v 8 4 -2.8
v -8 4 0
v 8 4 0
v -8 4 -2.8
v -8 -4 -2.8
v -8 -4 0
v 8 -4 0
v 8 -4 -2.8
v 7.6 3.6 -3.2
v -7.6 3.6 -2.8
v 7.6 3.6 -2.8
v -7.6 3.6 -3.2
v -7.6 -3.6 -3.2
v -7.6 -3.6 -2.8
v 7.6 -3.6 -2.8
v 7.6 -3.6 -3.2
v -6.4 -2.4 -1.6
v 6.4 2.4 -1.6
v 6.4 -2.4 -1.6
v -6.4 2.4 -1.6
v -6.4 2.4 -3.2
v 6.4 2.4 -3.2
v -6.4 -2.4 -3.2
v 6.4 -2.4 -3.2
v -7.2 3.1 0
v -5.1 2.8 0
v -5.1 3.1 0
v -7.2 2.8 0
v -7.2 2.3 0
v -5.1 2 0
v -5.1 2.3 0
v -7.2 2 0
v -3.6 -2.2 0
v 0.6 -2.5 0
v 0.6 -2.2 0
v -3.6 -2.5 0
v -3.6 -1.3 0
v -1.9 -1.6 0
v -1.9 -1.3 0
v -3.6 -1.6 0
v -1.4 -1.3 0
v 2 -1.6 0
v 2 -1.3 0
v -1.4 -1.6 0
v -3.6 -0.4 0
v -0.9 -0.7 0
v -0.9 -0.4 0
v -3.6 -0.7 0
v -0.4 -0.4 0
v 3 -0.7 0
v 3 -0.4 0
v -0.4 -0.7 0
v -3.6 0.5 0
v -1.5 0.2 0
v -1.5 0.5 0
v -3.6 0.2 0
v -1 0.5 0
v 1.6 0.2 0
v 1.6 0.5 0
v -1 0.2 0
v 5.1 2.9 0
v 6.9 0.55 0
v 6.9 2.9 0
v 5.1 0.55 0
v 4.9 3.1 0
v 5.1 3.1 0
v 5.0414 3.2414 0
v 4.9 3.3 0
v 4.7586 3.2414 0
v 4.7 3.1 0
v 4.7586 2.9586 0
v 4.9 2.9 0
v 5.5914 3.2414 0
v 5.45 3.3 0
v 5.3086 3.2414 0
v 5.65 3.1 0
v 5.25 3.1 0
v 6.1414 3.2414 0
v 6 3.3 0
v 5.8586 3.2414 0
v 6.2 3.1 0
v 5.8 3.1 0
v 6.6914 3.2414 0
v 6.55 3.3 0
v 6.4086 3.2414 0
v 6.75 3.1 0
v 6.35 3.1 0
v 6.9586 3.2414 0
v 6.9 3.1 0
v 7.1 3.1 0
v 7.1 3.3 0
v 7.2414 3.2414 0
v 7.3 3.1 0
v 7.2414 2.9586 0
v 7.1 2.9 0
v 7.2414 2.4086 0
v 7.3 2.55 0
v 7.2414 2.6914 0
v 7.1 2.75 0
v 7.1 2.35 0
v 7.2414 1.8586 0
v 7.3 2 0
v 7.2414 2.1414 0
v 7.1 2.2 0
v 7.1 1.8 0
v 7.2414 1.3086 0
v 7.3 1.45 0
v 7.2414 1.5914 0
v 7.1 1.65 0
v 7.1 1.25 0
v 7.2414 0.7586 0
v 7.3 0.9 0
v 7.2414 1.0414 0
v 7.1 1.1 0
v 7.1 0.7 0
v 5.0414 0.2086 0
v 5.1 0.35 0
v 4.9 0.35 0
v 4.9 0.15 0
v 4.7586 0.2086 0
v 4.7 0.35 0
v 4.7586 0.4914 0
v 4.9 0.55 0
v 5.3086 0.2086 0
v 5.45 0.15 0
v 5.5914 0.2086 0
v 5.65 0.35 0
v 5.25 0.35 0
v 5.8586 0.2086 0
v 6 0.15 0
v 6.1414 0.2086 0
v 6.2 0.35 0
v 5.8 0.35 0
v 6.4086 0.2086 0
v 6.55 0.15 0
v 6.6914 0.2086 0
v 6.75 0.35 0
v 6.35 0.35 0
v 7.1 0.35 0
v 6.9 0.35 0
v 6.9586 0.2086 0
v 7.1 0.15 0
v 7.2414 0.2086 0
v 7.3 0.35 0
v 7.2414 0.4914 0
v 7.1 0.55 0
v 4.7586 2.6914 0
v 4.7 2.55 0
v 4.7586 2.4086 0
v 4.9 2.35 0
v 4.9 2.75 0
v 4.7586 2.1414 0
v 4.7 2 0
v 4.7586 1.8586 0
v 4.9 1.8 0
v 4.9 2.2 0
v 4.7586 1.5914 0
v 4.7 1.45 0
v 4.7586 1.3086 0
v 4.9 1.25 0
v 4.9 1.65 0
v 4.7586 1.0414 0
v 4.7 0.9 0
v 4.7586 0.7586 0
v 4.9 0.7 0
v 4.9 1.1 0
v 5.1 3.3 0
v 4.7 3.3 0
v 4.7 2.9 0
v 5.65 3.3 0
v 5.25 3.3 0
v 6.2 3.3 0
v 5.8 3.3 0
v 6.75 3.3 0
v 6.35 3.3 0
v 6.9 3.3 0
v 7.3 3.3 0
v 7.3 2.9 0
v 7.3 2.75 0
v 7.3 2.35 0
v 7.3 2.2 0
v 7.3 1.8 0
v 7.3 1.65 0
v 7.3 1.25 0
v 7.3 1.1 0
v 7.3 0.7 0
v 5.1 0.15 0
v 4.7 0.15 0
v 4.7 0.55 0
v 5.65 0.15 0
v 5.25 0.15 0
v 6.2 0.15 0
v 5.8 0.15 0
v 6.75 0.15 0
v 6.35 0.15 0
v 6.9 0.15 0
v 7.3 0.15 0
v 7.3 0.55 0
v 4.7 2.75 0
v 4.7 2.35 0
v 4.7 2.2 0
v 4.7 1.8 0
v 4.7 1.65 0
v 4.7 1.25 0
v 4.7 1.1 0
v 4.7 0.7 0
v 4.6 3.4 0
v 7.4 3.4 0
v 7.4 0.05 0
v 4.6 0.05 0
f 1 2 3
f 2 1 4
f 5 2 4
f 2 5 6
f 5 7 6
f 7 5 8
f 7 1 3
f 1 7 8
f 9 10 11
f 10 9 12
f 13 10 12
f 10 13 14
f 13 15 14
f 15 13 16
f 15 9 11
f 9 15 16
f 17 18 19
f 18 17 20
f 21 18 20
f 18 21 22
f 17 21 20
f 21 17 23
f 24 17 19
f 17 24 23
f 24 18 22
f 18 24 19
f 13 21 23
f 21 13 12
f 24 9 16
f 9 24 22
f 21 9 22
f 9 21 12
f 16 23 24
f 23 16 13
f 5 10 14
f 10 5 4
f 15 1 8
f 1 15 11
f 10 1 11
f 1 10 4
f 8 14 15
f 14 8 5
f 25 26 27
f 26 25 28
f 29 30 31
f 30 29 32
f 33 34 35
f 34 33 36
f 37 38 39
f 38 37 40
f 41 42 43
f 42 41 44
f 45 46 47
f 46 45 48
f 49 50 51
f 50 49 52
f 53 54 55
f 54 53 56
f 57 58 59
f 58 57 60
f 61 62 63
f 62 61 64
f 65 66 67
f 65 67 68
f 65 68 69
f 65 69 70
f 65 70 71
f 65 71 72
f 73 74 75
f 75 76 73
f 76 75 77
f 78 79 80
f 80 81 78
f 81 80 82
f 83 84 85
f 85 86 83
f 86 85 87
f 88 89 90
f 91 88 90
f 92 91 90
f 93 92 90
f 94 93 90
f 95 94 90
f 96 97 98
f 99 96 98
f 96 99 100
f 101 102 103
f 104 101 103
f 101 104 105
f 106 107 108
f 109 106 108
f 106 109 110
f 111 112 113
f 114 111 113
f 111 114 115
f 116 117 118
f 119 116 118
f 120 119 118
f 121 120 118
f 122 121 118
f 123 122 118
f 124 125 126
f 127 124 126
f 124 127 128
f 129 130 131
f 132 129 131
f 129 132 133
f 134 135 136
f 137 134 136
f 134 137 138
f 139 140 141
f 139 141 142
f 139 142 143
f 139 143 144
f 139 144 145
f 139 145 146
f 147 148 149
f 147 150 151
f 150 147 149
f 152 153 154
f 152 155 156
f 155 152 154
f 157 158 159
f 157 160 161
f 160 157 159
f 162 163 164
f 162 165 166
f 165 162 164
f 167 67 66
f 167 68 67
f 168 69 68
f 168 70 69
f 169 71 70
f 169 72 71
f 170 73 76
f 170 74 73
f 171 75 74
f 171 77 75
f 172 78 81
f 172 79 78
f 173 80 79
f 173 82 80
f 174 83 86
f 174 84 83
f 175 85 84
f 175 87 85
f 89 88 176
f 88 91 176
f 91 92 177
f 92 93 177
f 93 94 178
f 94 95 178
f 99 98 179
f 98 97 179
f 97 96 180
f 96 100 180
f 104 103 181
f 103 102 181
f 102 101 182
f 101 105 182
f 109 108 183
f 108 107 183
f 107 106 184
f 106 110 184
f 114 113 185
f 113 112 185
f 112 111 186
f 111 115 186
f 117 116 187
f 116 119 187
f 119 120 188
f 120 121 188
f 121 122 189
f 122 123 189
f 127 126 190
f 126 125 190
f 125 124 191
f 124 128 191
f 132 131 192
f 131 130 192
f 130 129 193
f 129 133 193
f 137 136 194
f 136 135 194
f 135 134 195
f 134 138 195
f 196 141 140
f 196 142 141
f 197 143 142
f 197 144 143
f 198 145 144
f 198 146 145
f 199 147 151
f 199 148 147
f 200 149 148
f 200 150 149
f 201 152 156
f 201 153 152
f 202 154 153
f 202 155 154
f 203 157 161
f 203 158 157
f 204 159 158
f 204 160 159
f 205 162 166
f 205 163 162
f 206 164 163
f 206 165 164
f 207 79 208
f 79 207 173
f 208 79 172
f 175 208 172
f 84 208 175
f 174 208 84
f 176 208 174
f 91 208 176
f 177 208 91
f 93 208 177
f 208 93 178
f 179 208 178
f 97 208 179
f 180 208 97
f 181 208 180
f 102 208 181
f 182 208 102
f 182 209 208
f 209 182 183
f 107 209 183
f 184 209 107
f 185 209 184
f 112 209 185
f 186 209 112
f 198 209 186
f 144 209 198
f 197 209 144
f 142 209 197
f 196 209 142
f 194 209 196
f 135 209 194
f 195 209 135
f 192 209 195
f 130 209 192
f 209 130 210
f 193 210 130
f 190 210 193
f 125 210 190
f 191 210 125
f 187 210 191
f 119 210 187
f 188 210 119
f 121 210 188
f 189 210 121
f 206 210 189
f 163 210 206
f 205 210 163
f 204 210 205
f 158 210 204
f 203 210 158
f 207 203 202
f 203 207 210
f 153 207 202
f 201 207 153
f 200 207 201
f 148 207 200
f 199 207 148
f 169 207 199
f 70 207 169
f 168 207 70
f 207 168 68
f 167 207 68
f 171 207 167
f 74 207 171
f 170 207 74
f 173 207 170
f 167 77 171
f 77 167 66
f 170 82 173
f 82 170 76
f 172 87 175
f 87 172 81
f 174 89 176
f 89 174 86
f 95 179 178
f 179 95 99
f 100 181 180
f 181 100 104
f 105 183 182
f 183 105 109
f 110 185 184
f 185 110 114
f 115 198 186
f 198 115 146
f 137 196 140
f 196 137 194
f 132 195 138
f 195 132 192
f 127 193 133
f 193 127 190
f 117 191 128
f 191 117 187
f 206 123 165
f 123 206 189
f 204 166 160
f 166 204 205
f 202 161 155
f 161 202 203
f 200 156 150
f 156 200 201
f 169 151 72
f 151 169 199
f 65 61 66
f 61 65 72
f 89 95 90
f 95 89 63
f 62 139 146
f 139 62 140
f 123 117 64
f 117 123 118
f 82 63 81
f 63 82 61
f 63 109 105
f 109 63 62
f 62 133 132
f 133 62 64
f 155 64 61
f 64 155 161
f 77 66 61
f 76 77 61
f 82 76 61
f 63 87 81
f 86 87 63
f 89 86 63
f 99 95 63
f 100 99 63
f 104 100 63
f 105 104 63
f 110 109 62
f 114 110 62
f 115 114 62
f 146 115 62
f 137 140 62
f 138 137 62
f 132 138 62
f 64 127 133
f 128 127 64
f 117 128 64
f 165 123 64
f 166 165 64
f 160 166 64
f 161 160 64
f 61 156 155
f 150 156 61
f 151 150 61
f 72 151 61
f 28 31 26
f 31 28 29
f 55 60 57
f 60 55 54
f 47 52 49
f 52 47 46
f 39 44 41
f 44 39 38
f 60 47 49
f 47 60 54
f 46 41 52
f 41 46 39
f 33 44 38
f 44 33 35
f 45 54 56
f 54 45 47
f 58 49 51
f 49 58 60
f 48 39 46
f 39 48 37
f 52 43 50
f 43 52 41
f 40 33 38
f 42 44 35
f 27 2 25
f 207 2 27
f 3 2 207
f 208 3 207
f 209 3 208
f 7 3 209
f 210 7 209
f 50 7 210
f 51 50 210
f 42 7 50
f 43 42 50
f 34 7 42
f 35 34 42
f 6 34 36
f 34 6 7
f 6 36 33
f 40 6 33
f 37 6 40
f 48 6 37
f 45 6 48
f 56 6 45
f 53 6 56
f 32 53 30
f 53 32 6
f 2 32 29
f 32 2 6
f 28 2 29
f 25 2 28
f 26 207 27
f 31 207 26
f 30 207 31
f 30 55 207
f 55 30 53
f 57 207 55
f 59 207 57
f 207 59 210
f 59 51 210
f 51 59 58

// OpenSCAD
// file: ../p/box5.scad
use <../lib.scad>
function ldraw_lib__box5() = [
// 0 Box with 5 Faces and All Edges
// 0 Name: box5.dat
// 0 Author: James Jessiman
// 0 !LDRAW_ORG Primitive UPDATE 2012-01
// 0 !LICENSE Licensed under CC BY 4.0 : see CAreadme.txt
// 
// 0 BFC CERTIFY CCW
  [0,"BFC","CERTIFY"],
  [0,"BFC","CCW"],
// 
// 0 !HISTORY 2002-04-03 [sbliss] Modified for BFC compliance
// 0 !HISTORY 2002-04-25 [PTadmin] Official Update 2002-02
// 0 !HISTORY 2007-06-24 [PTadmin] Header formatted for Contributor Agreement
// 0 !HISTORY 2008-07-01 [PTadmin] Official Update 2008-01
// 0 !HISTORY 2012-02-16 [Philo] Changed to CCW
// 0 !HISTORY 2012-03-30 [PTadmin] Official Update 2012-01
// 
// 
// 2 24 1 1 1 -1 1 1
  [2,24,1,1,1,-1,1,1],
// 2 24 -1 1 1 -1 1 -1
  [2,24,-1,1,1,-1,1,-1],
// 2 24 -1 1 -1 1 1 -1
  [2,24,-1,1,-1,1,1,-1],
// 2 24 1 1 -1 1 1 1
  [2,24,1,1,-1,1,1,1],
// 2 24 1 0 1 -1 0 1
  [2,24,1,0,1,-1,0,1],
// 2 24 -1 0 1 -1 0 -1
  [2,24,-1,0,1,-1,0,-1],
// 2 24 -1 0 -1 1 0 -1
  [2,24,-1,0,-1,1,0,-1],
// 2 24 1 0 -1 1 0 1
  [2,24,1,0,-1,1,0,1],
// 2 24 1 0 1 1 1 1
  [2,24,1,0,1,1,1,1],
// 2 24 -1 0 1 -1 1 1
  [2,24,-1,0,1,-1,1,1],
// 2 24 1 0 -1 1 1 -1
  [2,24,1,0,-1,1,1,-1],
// 2 24 -1 0 -1 -1 1 -1
  [2,24,-1,0,-1,-1,1,-1],
// 4 16 -1 1 1 1 1 1 1 1 -1 -1 1 -1
  [4,16,-1,1,1,1,1,1,1,1,-1,-1,1,-1],
// 4 16 -1 1 1 -1 0 1 1 0 1 1 1 1
  [4,16,-1,1,1,-1,0,1,1,0,1,1,1,1],
// 4 16 -1 1 -1 -1 0 -1 -1 0 1 -1 1 1
  [4,16,-1,1,-1,-1,0,-1,-1,0,1,-1,1,1],
// 4 16 1 1 -1 1 0 -1 -1 0 -1 -1 1 -1
  [4,16,1,1,-1,1,0,-1,-1,0,-1,-1,1,-1],
// 4 16 1 1 1 1 0 1 1 0 -1 1 1 -1
  [4,16,1,1,1,1,0,1,1,0,-1,1,1,-1],
];
module ldraw_lib__box5(step=0, col=false, unit=2/5, alt=false, line=0.2, solid=!$preview)
    makepoly(ldraw_lib__box5(), step=step, col=col, unit=unit, alt=alt, line=line, solid=solid);
ldraw_lib__box5(line=0.2);
// file: ../p/box4.scad
use <../lib.scad>
function ldraw_lib__box4() = [
// 0 Box with 4 Faces (2 Parallel Pairs) and All Edges
// 0 Name: box4.dat
// 0 Author: James Jessiman
// 0 !LDRAW_ORG Primitive UPDATE 2012-01
// 0 !LICENSE Licensed under CC BY 4.0 : see CAreadme.txt
// 
// 0 BFC CERTIFY CCW
  [0,"BFC","CERTIFY"],
  [0,"BFC","CCW"],
// 
// 0 !HISTORY 2002-04-03 [sbliss] Modified for BFC compliance
// 0 !HISTORY 2002-04-25 [PTadmin] Official Update 2002-02
// 0 !HISTORY 2007-06-24 [PTadmin] Header formatted for Contributor Agreement
// 0 !HISTORY 2008-07-01 [PTadmin] Official Update 2008-01
// 0 !HISTORY 2012-02-16 [Philo] Changed to CCW
// 0 !HISTORY 2012-03-30 [PTadmin] Official Update 2012-01
// 
// 
// 2 24 1 1 1 -1 1 1
  [2,24,1,1,1,-1,1,1],
// 2 24 -1 1 1 -1 1 -1
  [2,24,-1,1,1,-1,1,-1],
// 2 24 -1 1 -1 1 1 -1
  [2,24,-1,1,-1,1,1,-1],
// 2 24 1 1 -1 1 1 1
  [2,24,1,1,-1,1,1,1],
// 2 24 1 0 1 -1 0 1
  [2,24,1,0,1,-1,0,1],
// 2 24 -1 0 1 -1 0 -1
  [2,24,-1,0,1,-1,0,-1],
// 2 24 -1 0 -1 1 0 -1
  [2,24,-1,0,-1,1,0,-1],
// 2 24 1 0 -1 1 0 1
  [2,24,1,0,-1,1,0,1],
// 2 24 1 0 1 1 1 1
  [2,24,1,0,1,1,1,1],
// 2 24 -1 0 1 -1 1 1
  [2,24,-1,0,1,-1,1,1],
// 2 24 1 0 -1 1 1 -1
  [2,24,1,0,-1,1,1,-1],
// 2 24 -1 0 -1 -1 1 -1
  [2,24,-1,0,-1,-1,1,-1],
// 4 16 -1 1 1 -1 0 1 1 0 1 1 1 1
  [4,16,-1,1,1,-1,0,1,1,0,1,1,1,1],
// 4 16 -1 1 -1 -1 0 -1 -1 0 1 -1 1 1
  [4,16,-1,1,-1,-1,0,-1,-1,0,1,-1,1,1],
// 4 16 1 1 -1 1 0 -1 -1 0 -1 -1 1 -1
  [4,16,1,1,-1,1,0,-1,-1,0,-1,-1,1,-1],
// 4 16 1 1 1 1 0 1 1 0 -1 1 1 -1
  [4,16,1,1,1,1,0,1,1,0,-1,1,1,-1],
];
module ldraw_lib__box4(step=0, col=false, unit=2/5, alt=false, line=0.2, solid=!$preview)
    makepoly(ldraw_lib__box4(), step=step, col=col, unit=unit, alt=alt, line=line, solid=solid);
ldraw_lib__box4(line=0.2);
// file: s/3069bs01.scad
use <../../lib.scad>
use <../../p/box4.scad>
use <../../p/box5.scad>
function ldraw_lib__s__3069bs01() = [
// 0 ~Tile  1 x  2 with Groove without Top Face
// 0 Name: s\3069bs01.dat
// 0 Author: Santeri Piippo [arezey]
// 0 !LDRAW_ORG Subpart UPDATE 2010-02
// 0 !LICENSE Licensed under CC BY 4.0 : see CAreadme.txt
// 
// 0 BFC CERTIFY CCW
  [0,"BFC","CERTIFY"],
  [0,"BFC","CCW"],
// 
// 0 !HISTORY 2010-07-05 [PTadmin] Official Update 2010-02
// 
// 
// 1 16 0 0 0 20 0 0 0 7 0 0 0 10 box4.dat
  [1,16,0,0,0,20,0,0,0,7,0,0,0,10, ldraw_lib__box4()],
// 1 16 0 7 0 19 0 0 0 1 0 0 0 9 box4.dat
  [1,16,0,7,0,19,0,0,0,1,0,0,0,9, ldraw_lib__box4()],
// 0 BFC INVERTNEXT
  [0,"BFC","INVERTNEXT"],
// 1 16 0 8 0 16 0 0 0 -4 0 0 0 6 box5.dat
  [1,16,0,8,0,16,0,0,0,-4,0,0,0,6, ldraw_lib__box5()],
// 4 16 -19 8 9 -16 8 6 -16 8 -6 -19 8 -9
  [4,16,-19,8,9,-16,8,6,-16,8,-6,-19,8,-9],
// 4 16 19 8 -9 16 8 -6 16 8 6 19 8 9
  [4,16,19,8,-9,16,8,-6,16,8,6,19,8,9],
// 4 16 19 8 9 16 8 6 -16 8 6 -19 8 9
  [4,16,19,8,9,16,8,6,-16,8,6,-19,8,9],
// 4 16 -19 8 -9 -16 8 -6 16 8 -6 19 8 -9
  [4,16,-19,8,-9,-16,8,-6,16,8,-6,19,8,-9],
// 4 16 -20 7 10 -19 7 9 -19 7 -9 -20 7 -10
  [4,16,-20,7,10,-19,7,9,-19,7,-9,-20,7,-10],
// 4 16 20 7 -10 19 7 -9 19 7 9 20 7 10
  [4,16,20,7,-10,19,7,-9,19,7,9,20,7,10],
// 4 16 20 7 10 19 7 9 -19 7 9 -20 7 10
  [4,16,20,7,10,19,7,9,-19,7,9,-20,7,10],
// 4 16 -20 7 -10 -19 7 -9 19 7 -9 20 7 -10
  [4,16,-20,7,-10,-19,7,-9,19,7,-9,20,7,-10],
// 0 //
];
module ldraw_lib__s__3069bs01(step=0, col=false, unit=2/5, alt=false, line=0.2, solid=!$preview)
    makepoly(ldraw_lib__s__3069bs01(), step=step, col=col, unit=unit, alt=alt, line=line, solid=solid);
ldraw_lib__s__3069bs01(line=0.2);
// file: ../p/8/3-4ndis.scad
use <../../lib.scad>
function ldraw_lib__8__3_4ndis() = [
// 0 Lo-Res Disc Negative 0.75
// 0 Name: 8\3-4ndis.dat
// 0 Author: Vincent Messenet [Cheenzo]
// 0 !LDRAW_ORG 8_Primitive UPDATE 2022-03
// 0 !LICENSE Licensed under CC BY 4.0 : see CAreadme.txt
// 
// 0 BFC CERTIFY CCW
  [0,"BFC","CERTIFY"],
  [0,"BFC","CCW"],
// 
// 0 !HISTORY 2022-05-07 [PTadmin] Official Update 2022-03
// 
// 
// 3 16 1 0 1 0.7071 0 0.7071 1 0 0
  [3,16,1,0,1,0.7071,0,0.7071,1,0,0],
// 3 16 1 0 1 0 0 1 0.7071 0 0.7071
  [3,16,1,0,1,0,0,1,0.7071,0,0.7071],
// 3 16 -1 0 1 -0.7071 0 0.7071 0 0 1
  [3,16,-1,0,1,-0.7071,0,0.7071,0,0,1],
// 3 16 -1 0 1 -1 0 0 -0.7071 0 0.7071
  [3,16,-1,0,1,-1,0,0,-0.7071,0,0.7071],
// 3 16 -1 0 -1 -0.7071 0 -0.7071 -1 0 0
  [3,16,-1,0,-1,-0.7071,0,-0.7071,-1,0,0],
// 3 16 -1 0 -1 0 0 -1 -0.7071 0 -0.7071
  [3,16,-1,0,-1,0,0,-1,-0.7071,0,-0.7071],
// 0 // Build by LDPartEditor (PrimGen 2.X)
];
module ldraw_lib__8__3_4ndis(step=0, col=false, unit=2/5, alt=false, line=0.2, solid=!$preview)
    makepoly(ldraw_lib__8__3_4ndis(), step=step, col=col, unit=unit, alt=alt, line=line, solid=solid);
ldraw_lib__8__3_4ndis(line=0.2);
// file: ../p/8/3-4disc.scad
use <../../lib.scad>
function ldraw_lib__8__3_4disc() = [
// 0 Lo-Res Disc 0.75
// 0 Name: 8\3-4disc.dat
// 0 Author: Vincent Messenet [Cheenzo]
// 0 !LDRAW_ORG 8_Primitive UPDATE 2022-03
// 0 !LICENSE Licensed under CC BY 4.0 : see CAreadme.txt
// 
// 0 BFC CERTIFY CCW
  [0,"BFC","CERTIFY"],
  [0,"BFC","CCW"],
// 
// 0 !HISTORY 2022-05-07 [PTadmin] Official Update 2022-03
// 
// 
// 3 16 0 0 0 1 0 0 0.7071 0 0.7071
  [3,16,0,0,0,1,0,0,0.7071,0,0.7071],
// 3 16 0 0 0 0.7071 0 0.7071 0 0 1
  [3,16,0,0,0,0.7071,0,0.7071,0,0,1],
// 3 16 0 0 0 0 0 1 -0.7071 0 0.7071
  [3,16,0,0,0,0,0,1,-0.7071,0,0.7071],
// 3 16 0 0 0 -0.7071 0 0.7071 -1 0 0
  [3,16,0,0,0,-0.7071,0,0.7071,-1,0,0],
// 3 16 0 0 0 -1 0 0 -0.7071 0 -0.7071
  [3,16,0,0,0,-1,0,0,-0.7071,0,-0.7071],
// 3 16 0 0 0 -0.7071 0 -0.7071 0 0 -1
  [3,16,0,0,0,-0.7071,0,-0.7071,0,0,-1],
// 0 // Build by LDPartEditor (PrimGen 2.X)
];
module ldraw_lib__8__3_4disc(step=0, col=false, unit=2/5, alt=false, line=0.2, solid=!$preview)
    makepoly(ldraw_lib__8__3_4disc(), step=step, col=col, unit=unit, alt=alt, line=line, solid=solid);
ldraw_lib__8__3_4disc(line=0.2);
// file: ../p/8/2-4ndis.scad
use <../../lib.scad>
function ldraw_lib__8__2_4ndis() = [
// 0 Lo-Res Disc Negative 0.5
// 0 Name: 8\2-4ndis.dat
// 0 Author: Magnus Forsberg [MagFors]
// 0 !LDRAW_ORG 8_Primitive UPDATE 2018-02
// 0 !LICENSE Licensed under CC BY 4.0 : see CAreadme.txt
// 
// 0 BFC CERTIFY CCW
  [0,"BFC","CERTIFY"],
  [0,"BFC","CCW"],
// 
// 0 !HISTORY 2018-12-08 [PTadmin] Official Update 2018-02
// 
// 
// 3 16 1 0 1 0.7071 0 0.7071 1 0 0
  [3,16,1,0,1,0.7071,0,0.7071,1,0,0],
// 3 16 1 0 1 0 0 1 0.7071 0 0.7071
  [3,16,1,0,1,0,0,1,0.7071,0,0.7071],
// 3 16 -1 0 1 -0.7071 0 0.7071 0 0 1
  [3,16,-1,0,1,-0.7071,0,0.7071,0,0,1],
// 3 16 -1 0 1 -1 0 0 -0.7071 0 0.7071
  [3,16,-1,0,1,-1,0,0,-0.7071,0,0.7071],
// 0 // Build by Primitive Generator 2
];
module ldraw_lib__8__2_4ndis(step=0, col=false, unit=2/5, alt=false, line=0.2, solid=!$preview)
    makepoly(ldraw_lib__8__2_4ndis(), step=step, col=col, unit=unit, alt=alt, line=line, solid=solid);
ldraw_lib__8__2_4ndis(line=0.2);
// file: ../p/8/2-4chrd.scad
use <../../lib.scad>
function ldraw_lib__8__2_4chrd() = [
// 0 Chord 0.5
// 0 Name: 8\2-4chrd.dat
// 0 Author: Magnus Forsberg [MagFors]
// 0 !LDRAW_ORG 8_Primitive UPDATE 2017-01
// 0 !LICENSE Licensed under CC BY 4.0 : see CAreadme.txt
// 
// 0 BFC CERTIFY CCW
  [0,"BFC","CERTIFY"],
  [0,"BFC","CCW"],
// 
// 0 !HISTORY 2017-12-30 [PTadmin] Official Update 2017-01
// 
// 
// 3 16 .7071 0 .7071 0 0 1 -.7071 0 .7071
  [3,16,.7071,0,.7071,0,0,1,-.7071,0,.7071],
// 4 16 .7071 0 .7071 -.7071 0 .7071 -1 0 0 1 0 0
  [4,16,.7071,0,.7071,-.7071,0,.7071,-1,0,0,1,0,0],
];
module ldraw_lib__8__2_4chrd(step=0, col=false, unit=2/5, alt=false, line=0.2, solid=!$preview)
    makepoly(ldraw_lib__8__2_4chrd(), step=step, col=col, unit=unit, alt=alt, line=line, solid=solid);
ldraw_lib__8__2_4chrd(line=0.2);
// main file
use <../lib.scad>
use <../p/8/2-4chrd.scad>
use <../p/8/2-4ndis.scad>
use <../p/8/3-4disc.scad>
use <../p/8/3-4ndis.scad>
use <s/3069bs01.scad>
function ldraw_lib__3069bp0l() = [
// 0 Tile  1 x  2 with Letter and Detailed Stamp Pattern
// 0 Name: 3069bp0l.dat
// 0 Author: Vincent Messenet [Cheenzo]
// 0 !LDRAW_ORG Part UPDATE 2022-03
// 0 !LICENSE Licensed under CC BY 4.0 : see CAreadme.txt
// 
// 0 BFC CERTIFY CW
  [0,"BFC","CERTIFY"],
  [0,"BFC","CW"],
// 
// 0 !KEYWORDS BrickLink 3069bpb851, Set 41449
// 
// 0 !HISTORY 2022-05-07 [PTadmin] Official Update 2022-03
// 
// 
// 1 16 0 0 0 1 0 0 0 1 0 0 0 1 s\3069bs01.dat
  [1,16,0,0,0,1,0,0,0,1,0,0,0,1, ldraw_lib__s__3069bs01()],
// 
// 4 321 -12.75 0 7 -18 0 7 -18 0 7.75 -12.75 0 7.75
  [4,321,-12.75,0,7,-18,0,7,-18,0,7.75,-12.75,0,7.75],
// 4 321 -12.75 0 5 -18 0 5 -18 0 5.75 -12.75 0 5.75
  [4,321,-12.75,0,5,-18,0,5,-18,0,5.75,-12.75,0,5.75],
// 4 321 1.5 0 -5.5 1.5 0 -6.25 -9 0 -6.25 -9 0 -5.5
  [4,321,1.5,0,-5.5,1.5,0,-6.25,-9,0,-6.25,-9,0,-5.5],
// 4 321 -4.75 0 -3.25 -4.75 0 -4 -9 0 -4 -9 0 -3.25
  [4,321,-4.75,0,-3.25,-4.75,0,-4,-9,0,-4,-9,0,-3.25],
// 4 321 5 0 -4 -3.5 0 -4 -3.5 0 -3.25 5 0 -3.25
  [4,321,5,0,-4,-3.5,0,-4,-3.5,0,-3.25,5,0,-3.25],
// 4 321 -2.25 0 -1 -2.25 0 -1.75 -9 0 -1.75 -9 0 -1
  [4,321,-2.25,0,-1,-2.25,0,-1.75,-9,0,-1.75,-9,0,-1],
// 4 321 7.5 0 -1.75 -1 0 -1.75 -1 0 -1 7.5 0 -1
  [4,321,7.5,0,-1.75,-1,0,-1.75,-1,0,-1,7.5,0,-1],
// 4 321 -3.75 0 1.25 -3.75 0 .5 -9 0 .5 -9 0 1.25
  [4,321,-3.75,0,1.25,-3.75,0,.5,-9,0,.5,-9,0,1.25],
// 4 321 -2.5 0 .5 -2.5 0 1.25 4 0 1.25 4 0 .5
  [4,321,-2.5,0,.5,-2.5,0,1.25,4,0,1.25,4,0,.5],
// 4 4 12.75 0 7.25 17.25 0 7.25 17.25 0 1.375 12.75 0 1.375
  [4,4,12.75,0,7.25,17.25,0,7.25,17.25,0,1.375,12.75,0,1.375],
// 1 16 12.25 0 7.75 .5 0 0 0 1 0 0 0 .5 8\3-4disc.dat
  [1,16,12.25,0,7.75,.5,0,0,0,1,0,0,0,.5, ldraw_lib__8__3_4disc()],
// 1 16 13.625 0 7.75 .5 0 0 0 1 0 0 0 .5 8\2-4chrd.dat
  [1,16,13.625,0,7.75,.5,0,0,0,1,0,0,0,.5, ldraw_lib__8__2_4chrd()],
// 1 16 15 0 7.75 .5 0 0 0 1 0 0 0 .5 8\2-4chrd.dat
  [1,16,15,0,7.75,.5,0,0,0,1,0,0,0,.5, ldraw_lib__8__2_4chrd()],
// 1 16 16.375 0 7.75 .5 0 0 0 1 0 0 0 .5 8\2-4chrd.dat
  [1,16,16.375,0,7.75,.5,0,0,0,1,0,0,0,.5, ldraw_lib__8__2_4chrd()],
// 1 16 17.75 0 7.75 -.5 0 0 0 1 0 0 0 .5 8\3-4disc.dat
  [1,16,17.75,0,7.75,-.5,0,0,0,1,0,0,0,.5, ldraw_lib__8__3_4disc()],
// 
// 1 16 17.75 0 6.375 0 0 .5 0 1 0 .5 0 0 8\2-4chrd.dat
  [1,16,17.75,0,6.375,0,0,.5,0,1,0,.5,0,0, ldraw_lib__8__2_4chrd()],
// 1 16 17.75 0 5 0 0 .5 0 1 0 .5 0 0 8\2-4chrd.dat
  [1,16,17.75,0,5,0,0,.5,0,1,0,.5,0,0, ldraw_lib__8__2_4chrd()],
// 1 16 17.75 0 3.625 0 0 .5 0 1 0 .5 0 0 8\2-4chrd.dat
  [1,16,17.75,0,3.625,0,0,.5,0,1,0,.5,0,0, ldraw_lib__8__2_4chrd()],
// 1 16 17.75 0 2.25 0 0 .5 0 1 0 .5 0 0 8\2-4chrd.dat
  [1,16,17.75,0,2.25,0,0,.5,0,1,0,.5,0,0, ldraw_lib__8__2_4chrd()],
// 
// 1 16 12.25 0 .875 .5 0 0 0 1 0 0 0 -.5 8\3-4disc.dat
  [1,16,12.25,0,.875,.5,0,0,0,1,0,0,0,-.5, ldraw_lib__8__3_4disc()],
// 1 16 13.625 0 .875 .5 0 0 0 1 0 0 0 -.5 8\2-4chrd.dat
  [1,16,13.625,0,.875,.5,0,0,0,1,0,0,0,-.5, ldraw_lib__8__2_4chrd()],
// 1 16 15 0 .875 .5 0 0 0 1 0 0 0 -.5 8\2-4chrd.dat
  [1,16,15,0,.875,.5,0,0,0,1,0,0,0,-.5, ldraw_lib__8__2_4chrd()],
// 1 16 16.375 0 .875 .5 0 0 0 1 0 0 0 -.5 8\2-4chrd.dat
  [1,16,16.375,0,.875,.5,0,0,0,1,0,0,0,-.5, ldraw_lib__8__2_4chrd()],
// 1 16 17.75 0 .875 -.5 0 0 0 1 0 0 0 -.5 8\3-4disc.dat
  [1,16,17.75,0,.875,-.5,0,0,0,1,0,0,0,-.5, ldraw_lib__8__3_4disc()],
// 
// 1 16 12.25 0 6.375 0 0 -.5 0 1 0 .5 0 0 8\2-4chrd.dat
  [1,16,12.25,0,6.375,0,0,-.5,0,1,0,.5,0,0, ldraw_lib__8__2_4chrd()],
// 1 16 12.25 0 5 0 0 -.5 0 1 0 .5 0 0 8\2-4chrd.dat
  [1,16,12.25,0,5,0,0,-.5,0,1,0,.5,0,0, ldraw_lib__8__2_4chrd()],
// 1 16 12.25 0 3.625 0 0 -.5 0 1 0 .5 0 0 8\2-4chrd.dat
  [1,16,12.25,0,3.625,0,0,-.5,0,1,0,.5,0,0, ldraw_lib__8__2_4chrd()],
// 1 16 12.25 0 2.25 0 0 -.5 0 1 0 .5 0 0 8\2-4chrd.dat
  [1,16,12.25,0,2.25,0,0,-.5,0,1,0,.5,0,0, ldraw_lib__8__2_4chrd()],
// 
// 1 4 12.25 0 7.75 .5 0 0 0 1 0 0 0 .5 8\3-4ndis.dat
  [1,4,12.25,0,7.75,.5,0,0,0,1,0,0,0,.5, ldraw_lib__8__3_4ndis()],
// 1 4 13.625 0 7.75 .5 0 0 0 1 0 0 0 .5 8\2-4ndis.dat
  [1,4,13.625,0,7.75,.5,0,0,0,1,0,0,0,.5, ldraw_lib__8__2_4ndis()],
// 1 4 15 0 7.75 .5 0 0 0 1 0 0 0 .5 8\2-4ndis.dat
  [1,4,15,0,7.75,.5,0,0,0,1,0,0,0,.5, ldraw_lib__8__2_4ndis()],
// 1 4 16.375 0 7.75 .5 0 0 0 1 0 0 0 .5 8\2-4ndis.dat
  [1,4,16.375,0,7.75,.5,0,0,0,1,0,0,0,.5, ldraw_lib__8__2_4ndis()],
// 1 4 17.75 0 7.75 -.5 0 0 0 1 0 0 0 .5 8\3-4ndis.dat
  [1,4,17.75,0,7.75,-.5,0,0,0,1,0,0,0,.5, ldraw_lib__8__3_4ndis()],
// 
// 1 4 17.75 0 6.375 0 0 .5 0 1 0 .5 0 0 8\2-4ndis.dat
  [1,4,17.75,0,6.375,0,0,.5,0,1,0,.5,0,0, ldraw_lib__8__2_4ndis()],
// 1 4 17.75 0 5 0 0 .5 0 1 0 .5 0 0 8\2-4ndis.dat
  [1,4,17.75,0,5,0,0,.5,0,1,0,.5,0,0, ldraw_lib__8__2_4ndis()],
// 1 4 17.75 0 3.625 0 0 .5 0 1 0 .5 0 0 8\2-4ndis.dat
  [1,4,17.75,0,3.625,0,0,.5,0,1,0,.5,0,0, ldraw_lib__8__2_4ndis()],
// 1 4 17.75 0 2.25 0 0 .5 0 1 0 .5 0 0 8\2-4ndis.dat
  [1,4,17.75,0,2.25,0,0,.5,0,1,0,.5,0,0, ldraw_lib__8__2_4ndis()],
// 
// 1 4 12.25 0 .875 .5 0 0 0 1 0 0 0 -.5 8\3-4ndis.dat
  [1,4,12.25,0,.875,.5,0,0,0,1,0,0,0,-.5, ldraw_lib__8__3_4ndis()],
// 1 4 13.625 0 .875 .5 0 0 0 1 0 0 0 -.5 8\2-4ndis.dat
  [1,4,13.625,0,.875,.5,0,0,0,1,0,0,0,-.5, ldraw_lib__8__2_4ndis()],
// 1 4 15 0 .875 .5 0 0 0 1 0 0 0 -.5 8\2-4ndis.dat
  [1,4,15,0,.875,.5,0,0,0,1,0,0,0,-.5, ldraw_lib__8__2_4ndis()],
// 1 4 16.375 0 .875 .5 0 0 0 1 0 0 0 -.5 8\2-4ndis.dat
  [1,4,16.375,0,.875,.5,0,0,0,1,0,0,0,-.5, ldraw_lib__8__2_4ndis()],
// 1 4 17.75 0 .875 -.5 0 0 0 1 0 0 0 -.5 8\3-4ndis.dat
  [1,4,17.75,0,.875,-.5,0,0,0,1,0,0,0,-.5, ldraw_lib__8__3_4ndis()],
// 
// 1 4 12.25 0 6.375 0 0 -.5 0 1 0 .5 0 0 8\2-4ndis.dat
  [1,4,12.25,0,6.375,0,0,-.5,0,1,0,.5,0,0, ldraw_lib__8__2_4ndis()],
// 1 4 12.25 0 5 0 0 -.5 0 1 0 .5 0 0 8\2-4ndis.dat
  [1,4,12.25,0,5,0,0,-.5,0,1,0,.5,0,0, ldraw_lib__8__2_4ndis()],
// 1 4 12.25 0 3.625 0 0 -.5 0 1 0 .5 0 0 8\2-4ndis.dat
  [1,4,12.25,0,3.625,0,0,-.5,0,1,0,.5,0,0, ldraw_lib__8__2_4ndis()],
// 1 4 12.25 0 2.25 0 0 -.5 0 1 0 .5 0 0 8\2-4ndis.dat
  [1,4,12.25,0,2.25,0,0,-.5,0,1,0,.5,0,0, ldraw_lib__8__2_4ndis()],
// 4 4 15 0 8.25 14.5 0 8.25 11.5 0 8.5 18.5 0 8.5
  [4,4,15,0,8.25,14.5,0,8.25,11.5,0,8.5,18.5,0,8.5],
// 3 4 15.5 0 8.25 15 0 8.25 18.5 0 8.5
  [3,4,15.5,0,8.25,15,0,8.25,18.5,0,8.5],
// 3 4 15.5 0 8.25 18.5 0 8.5 15.875 0 8.25
  [3,4,15.5,0,8.25,18.5,0,8.5,15.875,0,8.25],
// 3 4 15.875 0 8.25 18.5 0 8.5 16.375 0 8.25
  [3,4,15.875,0,8.25,18.5,0,8.5,16.375,0,8.25],
// 3 4 16.375 0 8.25 18.5 0 8.5 16.875 0 8.25
  [3,4,16.375,0,8.25,18.5,0,8.5,16.875,0,8.25],
// 3 4 16.875 0 8.25 18.5 0 8.5 17.25 0 8.25
  [3,4,16.875,0,8.25,18.5,0,8.5,17.25,0,8.25],
// 3 4 17.25 0 8.25 18.5 0 8.5 17.75 0 8.25
  [3,4,17.25,0,8.25,18.5,0,8.5,17.75,0,8.25],
// 3 4 17.75 0 8.25 18.5 0 8.5 18.25 0 8.25
  [3,4,17.75,0,8.25,18.5,0,8.5,18.25,0,8.25],
// 3 4 18.25 0 8.25 18.5 0 8.5 18.25 0 7.75
  [3,4,18.25,0,8.25,18.5,0,8.5,18.25,0,7.75],
// 3 4 18.25 0 7.25 18.25 0 7.75 18.5 0 8.5
  [3,4,18.25,0,7.25,18.25,0,7.75,18.5,0,8.5],
// 3 4 18.25 0 7.25 18.5 0 8.5 18.25 0 6.875
  [3,4,18.25,0,7.25,18.5,0,8.5,18.25,0,6.875],
// 3 4 18.25 0 6.875 18.5 0 8.5 18.25 0 6.375
  [3,4,18.25,0,6.875,18.5,0,8.5,18.25,0,6.375],
// 3 4 18.25 0 6.375 18.5 0 8.5 18.25 0 5.875
  [3,4,18.25,0,6.375,18.5,0,8.5,18.25,0,5.875],
// 3 4 18.25 0 5.875 18.5 0 8.5 18.25 0 5.5
  [3,4,18.25,0,5.875,18.5,0,8.5,18.25,0,5.5],
// 3 4 18.25 0 5.5 18.5 0 8.5 18.25 0 5
  [3,4,18.25,0,5.5,18.5,0,8.5,18.25,0,5],
// 3 4 18.25 0 5 18.5 0 8.5 18.25 0 4.5
  [3,4,18.25,0,5,18.5,0,8.5,18.25,0,4.5],
// 4 4 18.5 0 .125 18.25 0 4.125 18.25 0 4.5 18.5 0 8.5
  [4,4,18.5,0,.125,18.25,0,4.125,18.25,0,4.5,18.5,0,8.5],
// 3 4 18.25 0 4.125 18.5 0 .125 18.25 0 3.625
  [3,4,18.25,0,4.125,18.5,0,.125,18.25,0,3.625],
// 3 4 18.25 0 3.625 18.5 0 .125 18.25 0 3.125
  [3,4,18.25,0,3.625,18.5,0,.125,18.25,0,3.125],
// 3 4 18.25 0 3.125 18.5 0 .125 18.25 0 2.75
  [3,4,18.25,0,3.125,18.5,0,.125,18.25,0,2.75],
// 3 4 18.25 0 2.75 18.5 0 .125 18.25 0 2.25
  [3,4,18.25,0,2.75,18.5,0,.125,18.25,0,2.25],
// 3 4 18.25 0 2.25 18.5 0 .125 18.25 0 1.75
  [3,4,18.25,0,2.25,18.5,0,.125,18.25,0,1.75],
// 3 4 18.25 0 1.75 18.5 0 .125 18.25 0 1.375
  [3,4,18.25,0,1.75,18.5,0,.125,18.25,0,1.375],
// 3 4 18.25 0 1.375 18.5 0 .125 18.25 0 .875
  [3,4,18.25,0,1.375,18.5,0,.125,18.25,0,.875],
// 3 4 18.25 0 .875 18.5 0 .125 18.25 0 .375
  [3,4,18.25,0,.875,18.5,0,.125,18.25,0,.375],
// 3 4 18.25 0 .375 18.5 0 .125 17.75 0 .375
  [3,4,18.25,0,.375,18.5,0,.125,17.75,0,.375],
// 3 4 17.75 0 .375 18.5 0 .125 17.25 0 .375
  [3,4,17.75,0,.375,18.5,0,.125,17.25,0,.375],
// 3 4 17.25 0 .375 18.5 0 .125 16.875 0 .375
  [3,4,17.25,0,.375,18.5,0,.125,16.875,0,.375],
// 3 4 16.875 0 .375 18.5 0 .125 16.375 0 .375
  [3,4,16.875,0,.375,18.5,0,.125,16.375,0,.375],
// 3 4 16.375 0 .375 18.5 0 .125 15.875 0 .375
  [3,4,16.375,0,.375,18.5,0,.125,15.875,0,.375],
// 3 4 15.875 0 .375 18.5 0 .125 15.5 0 .375
  [3,4,15.875,0,.375,18.5,0,.125,15.5,0,.375],
// 4 4 15 0 .375 15.5 0 .375 18.5 0 .125 11.5 0 .125
  [4,4,15,0,.375,15.5,0,.375,18.5,0,.125,11.5,0,.125],
// 3 4 15 0 .375 11.5 0 .125 14.5 0 .375
  [3,4,15,0,.375,11.5,0,.125,14.5,0,.375],
// 3 4 14.5 0 .375 11.5 0 .125 14.125 0 .375
  [3,4,14.5,0,.375,11.5,0,.125,14.125,0,.375],
// 3 4 14.125 0 .375 11.5 0 .125 13.625 0 .375
  [3,4,14.125,0,.375,11.5,0,.125,13.625,0,.375],
// 3 4 13.625 0 .375 11.5 0 .125 13.125 0 .375
  [3,4,13.625,0,.375,11.5,0,.125,13.125,0,.375],
// 3 4 13.125 0 .375 11.5 0 .125 12.75 0 .375
  [3,4,13.125,0,.375,11.5,0,.125,12.75,0,.375],
// 3 4 12.75 0 .375 11.5 0 .125 12.25 0 .375
  [3,4,12.75,0,.375,11.5,0,.125,12.25,0,.375],
// 3 4 12.25 0 .375 11.5 0 .125 11.75 0 .375
  [3,4,12.25,0,.375,11.5,0,.125,11.75,0,.375],
// 3 4 11.75 0 .375 11.5 0 .125 11.75 0 .875
  [3,4,11.75,0,.375,11.5,0,.125,11.75,0,.875],
// 3 4 11.75 0 .875 11.5 0 .125 11.75 0 1.375
  [3,4,11.75,0,.875,11.5,0,.125,11.75,0,1.375],
// 3 4 11.75 0 1.375 11.5 0 .125 11.75 0 1.75
  [3,4,11.75,0,1.375,11.5,0,.125,11.75,0,1.75],
// 3 4 11.75 0 1.75 11.5 0 .125 11.75 0 2.25
  [3,4,11.75,0,1.75,11.5,0,.125,11.75,0,2.25],
// 3 4 11.75 0 2.25 11.5 0 .125 11.75 0 2.75
  [3,4,11.75,0,2.25,11.5,0,.125,11.75,0,2.75],
// 3 4 11.75 0 2.75 11.5 0 .125 11.75 0 3.125
  [3,4,11.75,0,2.75,11.5,0,.125,11.75,0,3.125],
// 3 4 11.75 0 3.125 11.5 0 .125 11.75 0 3.625
  [3,4,11.75,0,3.125,11.5,0,.125,11.75,0,3.625],
// 3 4 11.75 0 3.625 11.5 0 .125 11.75 0 4.125
  [3,4,11.75,0,3.625,11.5,0,.125,11.75,0,4.125],
// 4 4 11.75 0 4.5 11.75 0 4.125 11.5 0 .125 11.5 0 8.5
  [4,4,11.75,0,4.5,11.75,0,4.125,11.5,0,.125,11.5,0,8.5],
// 3 4 11.75 0 4.5 11.5 0 8.5 11.75 0 5
  [3,4,11.75,0,4.5,11.5,0,8.5,11.75,0,5],
// 3 4 11.75 0 5 11.5 0 8.5 11.75 0 5.5
  [3,4,11.75,0,5,11.5,0,8.5,11.75,0,5.5],
// 3 4 11.75 0 5.5 11.5 0 8.5 11.75 0 5.875
  [3,4,11.75,0,5.5,11.5,0,8.5,11.75,0,5.875],
// 3 4 11.75 0 5.875 11.5 0 8.5 11.75 0 6.375
  [3,4,11.75,0,5.875,11.5,0,8.5,11.75,0,6.375],
// 3 4 11.75 0 6.375 11.5 0 8.5 11.75 0 6.875
  [3,4,11.75,0,6.375,11.5,0,8.5,11.75,0,6.875],
// 3 4 11.75 0 6.875 11.5 0 8.5 11.75 0 7.25
  [3,4,11.75,0,6.875,11.5,0,8.5,11.75,0,7.25],
// 3 4 11.75 0 7.25 11.5 0 8.5 11.75 0 7.75
  [3,4,11.75,0,7.25,11.5,0,8.5,11.75,0,7.75],
// 3 4 11.75 0 7.75 11.5 0 8.5 11.75 0 8.25
  [3,4,11.75,0,7.75,11.5,0,8.5,11.75,0,8.25],
// 3 4 12.25 0 8.25 11.75 0 8.25 11.5 0 8.5
  [3,4,12.25,0,8.25,11.75,0,8.25,11.5,0,8.5],
// 3 4 12.25 0 8.25 11.5 0 8.5 12.75 0 8.25
  [3,4,12.25,0,8.25,11.5,0,8.5,12.75,0,8.25],
// 3 4 12.75 0 8.25 11.5 0 8.5 13.125 0 8.25
  [3,4,12.75,0,8.25,11.5,0,8.5,13.125,0,8.25],
// 3 4 13.125 0 8.25 11.5 0 8.5 13.625 0 8.25
  [3,4,13.125,0,8.25,11.5,0,8.5,13.625,0,8.25],
// 3 4 13.625 0 8.25 11.5 0 8.5 14.125 0 8.25
  [3,4,13.625,0,8.25,11.5,0,8.5,14.125,0,8.25],
// 3 4 14.125 0 8.25 11.5 0 8.5 14.5 0 8.25
  [3,4,14.125,0,8.25,11.5,0,8.5,14.5,0,8.25],
// 4 4 13.125 0 7.75 12.75 0 7.75 12.75 0 8.25 13.125 0 8.25
  [4,4,13.125,0,7.75,12.75,0,7.75,12.75,0,8.25,13.125,0,8.25],
// 4 4 14.5 0 7.75 14.125 0 7.75 14.125 0 8.25 14.5 0 8.25
  [4,4,14.5,0,7.75,14.125,0,7.75,14.125,0,8.25,14.5,0,8.25],
// 4 4 15.875 0 7.75 15.5 0 7.75 15.5 0 8.25 15.875 0 8.25
  [4,4,15.875,0,7.75,15.5,0,7.75,15.5,0,8.25,15.875,0,8.25],
// 4 4 17.25 0 7.75 16.875 0 7.75 16.875 0 8.25 17.25 0 8.25
  [4,4,17.25,0,7.75,16.875,0,7.75,16.875,0,8.25,17.25,0,8.25],
// 4 4 18.25 0 6.875 17.75 0 6.875 17.75 0 7.25 18.25 0 7.25
  [4,4,18.25,0,6.875,17.75,0,6.875,17.75,0,7.25,18.25,0,7.25],
// 4 4 18.25 0 5.875 18.25 0 5.5 17.75 0 5.5 17.75 0 5.875
  [4,4,18.25,0,5.875,18.25,0,5.5,17.75,0,5.5,17.75,0,5.875],
// 4 4 18.25 0 4.5 18.25 0 4.125 17.75 0 4.125 17.75 0 4.5
  [4,4,18.25,0,4.5,18.25,0,4.125,17.75,0,4.125,17.75,0,4.5],
// 4 4 18.25 0 3.125 18.25 0 2.75 17.75 0 2.75 17.75 0 3.125
  [4,4,18.25,0,3.125,18.25,0,2.75,17.75,0,2.75,17.75,0,3.125],
// 4 4 18.25 0 1.75 18.25 0 1.375 17.75 0 1.375 17.75 0 1.75
  [4,4,18.25,0,1.75,18.25,0,1.375,17.75,0,1.375,17.75,0,1.75],
// 4 4 16.875 0 .375 16.875 0 .875 17.25 0 .875 17.25 0 .375
  [4,4,16.875,0,.375,16.875,0,.875,17.25,0,.875,17.25,0,.375],
// 4 4 15.5 0 .375 15.5 0 .875 15.875 0 .875 15.875 0 .375
  [4,4,15.5,0,.375,15.5,0,.875,15.875,0,.875,15.875,0,.375],
// 4 4 14.125 0 .375 14.125 0 .875 14.5 0 .875 14.5 0 .375
  [4,4,14.125,0,.375,14.125,0,.875,14.5,0,.875,14.5,0,.375],
// 4 4 13.125 0 .375 12.75 0 .375 12.75 0 .875 13.125 0 .875
  [4,4,13.125,0,.375,12.75,0,.375,12.75,0,.875,13.125,0,.875],
// 4 4 12.25 0 1.375 11.75 0 1.375 11.75 0 1.75 12.25 0 1.75
  [4,4,12.25,0,1.375,11.75,0,1.375,11.75,0,1.75,12.25,0,1.75],
// 4 4 12.25 0 2.75 11.75 0 2.75 11.75 0 3.125 12.25 0 3.125
  [4,4,12.25,0,2.75,11.75,0,2.75,11.75,0,3.125,12.25,0,3.125],
// 4 4 12.25 0 4.125 11.75 0 4.125 11.75 0 4.5 12.25 0 4.5
  [4,4,12.25,0,4.125,11.75,0,4.125,11.75,0,4.5,12.25,0,4.5],
// 4 4 12.25 0 5.875 12.25 0 5.5 11.75 0 5.5 11.75 0 5.875
  [4,4,12.25,0,5.875,12.25,0,5.5,11.75,0,5.5,11.75,0,5.875],
// 4 4 12.25 0 6.875 11.75 0 6.875 11.75 0 7.25 12.25 0 7.25
  [4,4,12.25,0,6.875,11.75,0,6.875,11.75,0,7.25,12.25,0,7.25],
// 4 16 12.25 0 7.25 12.25 0 7.75 12.75 0 7.75 12.75 0 7.25
  [4,16,12.25,0,7.25,12.25,0,7.75,12.75,0,7.75,12.75,0,7.25],
// 4 16 17.25 0 7.25 17.25 0 7.75 17.75 0 7.75 17.75 0 7.25
  [4,16,17.25,0,7.25,17.25,0,7.75,17.75,0,7.75,17.75,0,7.25],
// 4 16 17.75 0 1.375 17.75 0 .875 17.25 0 .875 17.25 0 1.375
  [4,16,17.75,0,1.375,17.75,0,.875,17.25,0,.875,17.25,0,1.375],
// 4 16 12.25 0 1.375 12.75 0 1.375 12.75 0 .875 12.25 0 .875
  [4,16,12.25,0,1.375,12.75,0,1.375,12.75,0,.875,12.25,0,.875],
// 4 16 14.5 0 7.75 15.5 0 7.75 17.25 0 7.25 12.75 0 7.25
  [4,16,14.5,0,7.75,15.5,0,7.75,17.25,0,7.25,12.75,0,7.25],
// 4 16 17.25 0 7.25 17.75 0 4.5 17.75 0 4.125 17.25 0 1.375
  [4,16,17.25,0,7.25,17.75,0,4.5,17.75,0,4.125,17.25,0,1.375],
// 4 16 17.25 0 1.375 15.5 0 .875 14.5 0 .875 12.75 0 1.375
  [4,16,17.25,0,1.375,15.5,0,.875,14.5,0,.875,12.75,0,1.375],
// 4 16 12.75 0 1.375 12.25 0 4.125 12.25 0 4.5 12.75 0 7.25
  [4,16,12.75,0,1.375,12.25,0,4.125,12.25,0,4.5,12.75,0,7.25],
// 3 16 12.75 0 7.25 12.75 0 7.75 13.125 0 7.75
  [3,16,12.75,0,7.25,12.75,0,7.75,13.125,0,7.75],
// 3 16 12.75 0 7.25 13.125 0 7.75 14.125 0 7.75
  [3,16,12.75,0,7.25,13.125,0,7.75,14.125,0,7.75],
// 3 16 12.75 0 7.25 14.125 0 7.75 14.5 0 7.75
  [3,16,12.75,0,7.25,14.125,0,7.75,14.5,0,7.75],
// 3 16 15.5 0 7.75 15.875 0 7.75 17.25 0 7.25
  [3,16,15.5,0,7.75,15.875,0,7.75,17.25,0,7.25],
// 3 16 17.25 0 7.25 15.875 0 7.75 16.875 0 7.75
  [3,16,17.25,0,7.25,15.875,0,7.75,16.875,0,7.75],
// 3 16 17.25 0 7.25 16.875 0 7.75 17.25 0 7.75
  [3,16,17.25,0,7.25,16.875,0,7.75,17.25,0,7.75],
// 3 16 17.25 0 7.25 17.75 0 7.25 17.75 0 6.875
  [3,16,17.25,0,7.25,17.75,0,7.25,17.75,0,6.875],
// 3 16 17.25 0 7.25 17.75 0 6.875 17.75 0 5.875
  [3,16,17.25,0,7.25,17.75,0,6.875,17.75,0,5.875],
// 3 16 17.25 0 7.25 17.75 0 5.875 17.75 0 5.5
  [3,16,17.25,0,7.25,17.75,0,5.875,17.75,0,5.5],
// 3 16 17.25 0 7.25 17.75 0 5.5 17.75 0 4.5
  [3,16,17.25,0,7.25,17.75,0,5.5,17.75,0,4.5],
// 3 16 17.25 0 1.375 17.75 0 4.125 17.75 0 3.125
  [3,16,17.25,0,1.375,17.75,0,4.125,17.75,0,3.125],
// 3 16 17.25 0 1.375 17.75 0 3.125 17.75 0 2.75
  [3,16,17.25,0,1.375,17.75,0,3.125,17.75,0,2.75],
// 3 16 17.25 0 1.375 17.75 0 2.75 17.75 0 1.75
  [3,16,17.25,0,1.375,17.75,0,2.75,17.75,0,1.75],
// 3 16 17.25 0 1.375 17.75 0 1.75 17.75 0 1.375
  [3,16,17.25,0,1.375,17.75,0,1.75,17.75,0,1.375],
// 3 16 17.25 0 1.375 17.25 0 .875 16.875 0 .875
  [3,16,17.25,0,1.375,17.25,0,.875,16.875,0,.875],
// 3 16 17.25 0 1.375 16.875 0 .875 15.875 0 .875
  [3,16,17.25,0,1.375,16.875,0,.875,15.875,0,.875],
// 3 16 17.25 0 1.375 15.875 0 .875 15.5 0 .875
  [3,16,17.25,0,1.375,15.875,0,.875,15.5,0,.875],
// 3 16 14.5 0 .875 14.125 0 .875 12.75 0 1.375
  [3,16,14.5,0,.875,14.125,0,.875,12.75,0,1.375],
// 3 16 12.75 0 1.375 14.125 0 .875 13.125 0 .875
  [3,16,12.75,0,1.375,14.125,0,.875,13.125,0,.875],
// 3 16 12.75 0 1.375 13.125 0 .875 12.75 0 .875
  [3,16,12.75,0,1.375,13.125,0,.875,12.75,0,.875],
// 3 16 12.75 0 1.375 12.25 0 1.375 12.25 0 1.75
  [3,16,12.75,0,1.375,12.25,0,1.375,12.25,0,1.75],
// 3 16 12.75 0 1.375 12.25 0 1.75 12.25 0 2.75
  [3,16,12.75,0,1.375,12.25,0,1.75,12.25,0,2.75],
// 3 16 12.75 0 1.375 12.25 0 2.75 12.25 0 3.125
  [3,16,12.75,0,1.375,12.25,0,2.75,12.25,0,3.125],
// 3 16 12.75 0 1.375 12.25 0 3.125 12.25 0 4.125
  [3,16,12.75,0,1.375,12.25,0,3.125,12.25,0,4.125],
// 3 16 12.25 0 4.5 12.25 0 5.5 12.75 0 7.25
  [3,16,12.25,0,4.5,12.25,0,5.5,12.75,0,7.25],
// 3 16 12.75 0 7.25 12.25 0 5.5 12.25 0 5.875
  [3,16,12.75,0,7.25,12.25,0,5.5,12.25,0,5.875],
// 3 16 12.75 0 7.25 12.25 0 5.875 12.25 0 6.875
  [3,16,12.75,0,7.25,12.25,0,5.875,12.25,0,6.875],
// 3 16 12.75 0 7.25 12.25 0 6.875 12.25 0 7.25
  [3,16,12.75,0,7.25,12.25,0,6.875,12.25,0,7.25],
// 4 16 -12.75 0 5.75 -18 0 5.75 -18 0 7 -12.75 0 7
  [4,16,-12.75,0,5.75,-18,0,5.75,-18,0,7,-12.75,0,7],
// 4 16 -2.5 0 .5 -3.75 0 .5 -3.75 0 1.25 -2.5 0 1.25
  [4,16,-2.5,0,.5,-3.75,0,.5,-3.75,0,1.25,-2.5,0,1.25],
// 4 16 -1 0 -1.75 -2.25 0 -1.75 -2.25 0 -1 -1 0 -1
  [4,16,-1,0,-1.75,-2.25,0,-1.75,-2.25,0,-1,-1,0,-1],
// 4 16 -3.5 0 -4 -4.75 0 -4 -4.75 0 -3.25 -3.5 0 -3.25
  [4,16,-3.5,0,-4,-4.75,0,-4,-4.75,0,-3.25,-3.5,0,-3.25],
// 4 16 -1 0 -1 -2.25 0 -1 -3.75 0 .5 -2.5 0 .5
  [4,16,-1,0,-1,-2.25,0,-1,-3.75,0,.5,-2.5,0,.5],
// 4 16 -3.5 0 -3.25 -4.75 0 -3.25 -2.25 0 -1.75 -1 0 -1.75
  [4,16,-3.5,0,-3.25,-4.75,0,-3.25,-2.25,0,-1.75,-1,0,-1.75],
// 4 16 1.5 0 -5.5 -9 0 -5.5 -4.75 0 -4 -3.5 0 -4
  [4,16,1.5,0,-5.5,-9,0,-5.5,-4.75,0,-4,-3.5,0,-4],
// 4 16 -3.75 0 .5 -2.25 0 -1 -9 0 -1 -9 0 .5
  [4,16,-3.75,0,.5,-2.25,0,-1,-9,0,-1,-9,0,.5],
// 4 16 7.5 0 -1 -1 0 -1 -2.5 0 .5 4 0 .5
  [4,16,7.5,0,-1,-1,0,-1,-2.5,0,.5,4,0,.5],
// 4 16 -4.75 0 -3.25 -9 0 -3.25 -9 0 -1.75 -2.25 0 -1.75
  [4,16,-4.75,0,-3.25,-9,0,-3.25,-9,0,-1.75,-2.25,0,-1.75],
// 4 16 7.5 0 -1.75 5 0 -3.25 -3.5 0 -3.25 -1 0 -1.75
  [4,16,7.5,0,-1.75,5,0,-3.25,-3.5,0,-3.25,-1,0,-1.75],
// 3 16 -4.75 0 -4 -9 0 -5.5 -9 0 -4
  [3,16,-4.75,0,-4,-9,0,-5.5,-9,0,-4],
// 3 16 1.5 0 -5.5 -3.5 0 -4 5 0 -4
  [3,16,1.5,0,-5.5,-3.5,0,-4,5,0,-4],
// 3 16 -18 0 7.75 -20 0 10 -12.75 0 7.75
  [3,16,-18,0,7.75,-20,0,10,-12.75,0,7.75],
// 3 16 -12.75 0 7.75 -20 0 10 11.5 0 8.5
  [3,16,-12.75,0,7.75,-20,0,10,11.5,0,8.5],
// 3 16 11.5 0 8.5 -20 0 10 20 0 10
  [3,16,11.5,0,8.5,-20,0,10,20,0,10],
// 3 16 11.5 0 8.5 20 0 10 18.5 0 8.5
  [3,16,11.5,0,8.5,20,0,10,18.5,0,8.5],
// 3 16 18.5 0 8.5 20 0 10 18.5 0 .125
  [3,16,18.5,0,8.5,20,0,10,18.5,0,.125],
// 3 16 18.5 0 .125 20 0 10 20 0 -10
  [3,16,18.5,0,.125,20,0,10,20,0,-10],
// 3 16 18.5 0 .125 20 0 -10 11.5 0 .125
  [3,16,18.5,0,.125,20,0,-10,11.5,0,.125],
// 3 16 11.5 0 .125 20 0 -10 7.5 0 -1.75
  [3,16,11.5,0,.125,20,0,-10,7.5,0,-1.75],
// 3 16 11.5 0 .125 7.5 0 -1.75 7.5 0 -1
  [3,16,11.5,0,.125,7.5,0,-1.75,7.5,0,-1],
// 3 16 7.5 0 -1.75 20 0 -10 5 0 -4
  [3,16,7.5,0,-1.75,20,0,-10,5,0,-4],
// 3 16 7.5 0 -1.75 5 0 -4 5 0 -3.25
  [3,16,7.5,0,-1.75,5,0,-4,5,0,-3.25],
// 3 16 5 0 -4 20 0 -10 1.5 0 -6.25
  [3,16,5,0,-4,20,0,-10,1.5,0,-6.25],
// 3 16 5 0 -4 1.5 0 -6.25 1.5 0 -5.5
  [3,16,5,0,-4,1.5,0,-6.25,1.5,0,-5.5],
// 4 16 -9 0 -6.25 1.5 0 -6.25 20 0 -10 -20 0 -10
  [4,16,-9,0,-6.25,1.5,0,-6.25,20,0,-10,-20,0,-10],
// 3 16 -9 0 -5.5 -9 0 -6.25 -20 0 -10
  [3,16,-9,0,-5.5,-9,0,-6.25,-20,0,-10],
// 3 16 -9 0 -5.5 -20 0 -10 -9 0 -4
  [3,16,-9,0,-5.5,-20,0,-10,-9,0,-4],
// 3 16 -9 0 -4 -20 0 -10 -9 0 -3.25
  [3,16,-9,0,-4,-20,0,-10,-9,0,-3.25],
// 3 16 -9 0 -3.25 -20 0 -10 -9 0 -1.75
  [3,16,-9,0,-3.25,-20,0,-10,-9,0,-1.75],
// 3 16 -9 0 -1.75 -20 0 -10 -9 0 -1
  [3,16,-9,0,-1.75,-20,0,-10,-9,0,-1],
// 3 16 -9 0 -1 -20 0 -10 -9 0 .5
  [3,16,-9,0,-1,-20,0,-10,-9,0,.5],
// 3 16 -9 0 .5 -20 0 -10 -9 0 1.25
  [3,16,-9,0,.5,-20,0,-10,-9,0,1.25],
// 4 16 -12.75 0 5 -9 0 1.25 -20 0 -10 -18 0 5
  [4,16,-12.75,0,5,-9,0,1.25,-20,0,-10,-18,0,5],
// 4 16 -18 0 5.75 -18 0 5 -20 0 -10 -20 0 10
  [4,16,-18,0,5.75,-18,0,5,-20,0,-10,-20,0,10],
// 3 16 -18 0 5.75 -20 0 10 -18 0 7
  [3,16,-18,0,5.75,-20,0,10,-18,0,7],
// 3 16 -18 0 7 -20 0 10 -18 0 7.75
  [3,16,-18,0,7,-20,0,10,-18,0,7.75],
// 3 16 -12.75 0 7.75 11.5 0 8.5 -12.75 0 7
  [3,16,-12.75,0,7.75,11.5,0,8.5,-12.75,0,7],
// 3 16 -12.75 0 7 11.5 0 8.5 -12.75 0 5.75
  [3,16,-12.75,0,7,11.5,0,8.5,-12.75,0,5.75],
// 3 16 -12.75 0 5.75 11.5 0 8.5 -12.75 0 5
  [3,16,-12.75,0,5.75,11.5,0,8.5,-12.75,0,5],
// 4 16 -9 0 1.25 -12.75 0 5 11.5 0 8.5 -3.75 0 1.25
  [4,16,-9,0,1.25,-12.75,0,5,11.5,0,8.5,-3.75,0,1.25],
// 3 16 -3.75 0 1.25 11.5 0 8.5 -2.5 0 1.25
  [3,16,-3.75,0,1.25,11.5,0,8.5,-2.5,0,1.25],
// 3 16 -2.5 0 1.25 11.5 0 8.5 4 0 1.25
  [3,16,-2.5,0,1.25,11.5,0,8.5,4,0,1.25],
// 3 16 11.5 0 .125 4 0 1.25 11.5 0 8.5
  [3,16,11.5,0,.125,4,0,1.25,11.5,0,8.5],
// 4 16 11.5 0 .125 7.5 0 -1 4 0 .5 4 0 1.25
  [4,16,11.5,0,.125,7.5,0,-1,4,0,.5,4,0,1.25],
];
module ldraw_lib__3069bp0l(step=0, col=false, unit=2/5, alt=false, line=0.2, solid=!$preview)
    makepoly(ldraw_lib__3069bp0l(), step=step, col=col, unit=unit, alt=alt, line=line, solid=solid);
ldraw_lib__3069bp0l(line=0.2);
